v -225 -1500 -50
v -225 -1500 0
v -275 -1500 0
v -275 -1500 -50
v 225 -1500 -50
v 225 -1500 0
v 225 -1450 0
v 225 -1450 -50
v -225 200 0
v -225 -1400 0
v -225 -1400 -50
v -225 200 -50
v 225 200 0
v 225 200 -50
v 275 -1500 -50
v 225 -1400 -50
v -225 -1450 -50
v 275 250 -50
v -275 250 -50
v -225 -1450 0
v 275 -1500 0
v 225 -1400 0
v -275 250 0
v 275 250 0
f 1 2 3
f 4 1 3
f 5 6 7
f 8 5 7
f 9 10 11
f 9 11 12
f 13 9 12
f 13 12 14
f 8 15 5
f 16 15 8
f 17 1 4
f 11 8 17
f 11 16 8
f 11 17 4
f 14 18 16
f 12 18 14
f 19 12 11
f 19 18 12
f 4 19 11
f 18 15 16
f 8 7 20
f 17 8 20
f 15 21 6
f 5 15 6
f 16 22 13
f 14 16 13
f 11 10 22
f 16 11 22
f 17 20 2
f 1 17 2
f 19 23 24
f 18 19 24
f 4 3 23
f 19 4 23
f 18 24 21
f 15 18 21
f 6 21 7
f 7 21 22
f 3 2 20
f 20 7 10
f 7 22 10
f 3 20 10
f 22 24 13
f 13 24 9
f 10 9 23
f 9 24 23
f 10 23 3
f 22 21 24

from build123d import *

# Parameters (mm, degrees)
CROQUIS1_W              = 450
CROQUIS1_H              = 1600
SALIENTE_EXTRUIR1_DEPTH = 50


with BuildPart() as part:
    # Croquis1 → Saliente-Extruir1 (new body)
    with BuildSketch(Plane.XY):
        Polygon((-275, -1500), (-275, 250), (275, 250), (275, -1500), (225, -1500), (225, -1450), (-225, -1450), (-225, -1500), align=None)
        with Locations((0, -600)):
            Rectangle(CROQUIS1_W, CROQUIS1_H, mode=Mode.SUBTRACT)
    extrude(amount=-SALIENTE_EXTRUIR1_DEPTH)


solid = part.part
